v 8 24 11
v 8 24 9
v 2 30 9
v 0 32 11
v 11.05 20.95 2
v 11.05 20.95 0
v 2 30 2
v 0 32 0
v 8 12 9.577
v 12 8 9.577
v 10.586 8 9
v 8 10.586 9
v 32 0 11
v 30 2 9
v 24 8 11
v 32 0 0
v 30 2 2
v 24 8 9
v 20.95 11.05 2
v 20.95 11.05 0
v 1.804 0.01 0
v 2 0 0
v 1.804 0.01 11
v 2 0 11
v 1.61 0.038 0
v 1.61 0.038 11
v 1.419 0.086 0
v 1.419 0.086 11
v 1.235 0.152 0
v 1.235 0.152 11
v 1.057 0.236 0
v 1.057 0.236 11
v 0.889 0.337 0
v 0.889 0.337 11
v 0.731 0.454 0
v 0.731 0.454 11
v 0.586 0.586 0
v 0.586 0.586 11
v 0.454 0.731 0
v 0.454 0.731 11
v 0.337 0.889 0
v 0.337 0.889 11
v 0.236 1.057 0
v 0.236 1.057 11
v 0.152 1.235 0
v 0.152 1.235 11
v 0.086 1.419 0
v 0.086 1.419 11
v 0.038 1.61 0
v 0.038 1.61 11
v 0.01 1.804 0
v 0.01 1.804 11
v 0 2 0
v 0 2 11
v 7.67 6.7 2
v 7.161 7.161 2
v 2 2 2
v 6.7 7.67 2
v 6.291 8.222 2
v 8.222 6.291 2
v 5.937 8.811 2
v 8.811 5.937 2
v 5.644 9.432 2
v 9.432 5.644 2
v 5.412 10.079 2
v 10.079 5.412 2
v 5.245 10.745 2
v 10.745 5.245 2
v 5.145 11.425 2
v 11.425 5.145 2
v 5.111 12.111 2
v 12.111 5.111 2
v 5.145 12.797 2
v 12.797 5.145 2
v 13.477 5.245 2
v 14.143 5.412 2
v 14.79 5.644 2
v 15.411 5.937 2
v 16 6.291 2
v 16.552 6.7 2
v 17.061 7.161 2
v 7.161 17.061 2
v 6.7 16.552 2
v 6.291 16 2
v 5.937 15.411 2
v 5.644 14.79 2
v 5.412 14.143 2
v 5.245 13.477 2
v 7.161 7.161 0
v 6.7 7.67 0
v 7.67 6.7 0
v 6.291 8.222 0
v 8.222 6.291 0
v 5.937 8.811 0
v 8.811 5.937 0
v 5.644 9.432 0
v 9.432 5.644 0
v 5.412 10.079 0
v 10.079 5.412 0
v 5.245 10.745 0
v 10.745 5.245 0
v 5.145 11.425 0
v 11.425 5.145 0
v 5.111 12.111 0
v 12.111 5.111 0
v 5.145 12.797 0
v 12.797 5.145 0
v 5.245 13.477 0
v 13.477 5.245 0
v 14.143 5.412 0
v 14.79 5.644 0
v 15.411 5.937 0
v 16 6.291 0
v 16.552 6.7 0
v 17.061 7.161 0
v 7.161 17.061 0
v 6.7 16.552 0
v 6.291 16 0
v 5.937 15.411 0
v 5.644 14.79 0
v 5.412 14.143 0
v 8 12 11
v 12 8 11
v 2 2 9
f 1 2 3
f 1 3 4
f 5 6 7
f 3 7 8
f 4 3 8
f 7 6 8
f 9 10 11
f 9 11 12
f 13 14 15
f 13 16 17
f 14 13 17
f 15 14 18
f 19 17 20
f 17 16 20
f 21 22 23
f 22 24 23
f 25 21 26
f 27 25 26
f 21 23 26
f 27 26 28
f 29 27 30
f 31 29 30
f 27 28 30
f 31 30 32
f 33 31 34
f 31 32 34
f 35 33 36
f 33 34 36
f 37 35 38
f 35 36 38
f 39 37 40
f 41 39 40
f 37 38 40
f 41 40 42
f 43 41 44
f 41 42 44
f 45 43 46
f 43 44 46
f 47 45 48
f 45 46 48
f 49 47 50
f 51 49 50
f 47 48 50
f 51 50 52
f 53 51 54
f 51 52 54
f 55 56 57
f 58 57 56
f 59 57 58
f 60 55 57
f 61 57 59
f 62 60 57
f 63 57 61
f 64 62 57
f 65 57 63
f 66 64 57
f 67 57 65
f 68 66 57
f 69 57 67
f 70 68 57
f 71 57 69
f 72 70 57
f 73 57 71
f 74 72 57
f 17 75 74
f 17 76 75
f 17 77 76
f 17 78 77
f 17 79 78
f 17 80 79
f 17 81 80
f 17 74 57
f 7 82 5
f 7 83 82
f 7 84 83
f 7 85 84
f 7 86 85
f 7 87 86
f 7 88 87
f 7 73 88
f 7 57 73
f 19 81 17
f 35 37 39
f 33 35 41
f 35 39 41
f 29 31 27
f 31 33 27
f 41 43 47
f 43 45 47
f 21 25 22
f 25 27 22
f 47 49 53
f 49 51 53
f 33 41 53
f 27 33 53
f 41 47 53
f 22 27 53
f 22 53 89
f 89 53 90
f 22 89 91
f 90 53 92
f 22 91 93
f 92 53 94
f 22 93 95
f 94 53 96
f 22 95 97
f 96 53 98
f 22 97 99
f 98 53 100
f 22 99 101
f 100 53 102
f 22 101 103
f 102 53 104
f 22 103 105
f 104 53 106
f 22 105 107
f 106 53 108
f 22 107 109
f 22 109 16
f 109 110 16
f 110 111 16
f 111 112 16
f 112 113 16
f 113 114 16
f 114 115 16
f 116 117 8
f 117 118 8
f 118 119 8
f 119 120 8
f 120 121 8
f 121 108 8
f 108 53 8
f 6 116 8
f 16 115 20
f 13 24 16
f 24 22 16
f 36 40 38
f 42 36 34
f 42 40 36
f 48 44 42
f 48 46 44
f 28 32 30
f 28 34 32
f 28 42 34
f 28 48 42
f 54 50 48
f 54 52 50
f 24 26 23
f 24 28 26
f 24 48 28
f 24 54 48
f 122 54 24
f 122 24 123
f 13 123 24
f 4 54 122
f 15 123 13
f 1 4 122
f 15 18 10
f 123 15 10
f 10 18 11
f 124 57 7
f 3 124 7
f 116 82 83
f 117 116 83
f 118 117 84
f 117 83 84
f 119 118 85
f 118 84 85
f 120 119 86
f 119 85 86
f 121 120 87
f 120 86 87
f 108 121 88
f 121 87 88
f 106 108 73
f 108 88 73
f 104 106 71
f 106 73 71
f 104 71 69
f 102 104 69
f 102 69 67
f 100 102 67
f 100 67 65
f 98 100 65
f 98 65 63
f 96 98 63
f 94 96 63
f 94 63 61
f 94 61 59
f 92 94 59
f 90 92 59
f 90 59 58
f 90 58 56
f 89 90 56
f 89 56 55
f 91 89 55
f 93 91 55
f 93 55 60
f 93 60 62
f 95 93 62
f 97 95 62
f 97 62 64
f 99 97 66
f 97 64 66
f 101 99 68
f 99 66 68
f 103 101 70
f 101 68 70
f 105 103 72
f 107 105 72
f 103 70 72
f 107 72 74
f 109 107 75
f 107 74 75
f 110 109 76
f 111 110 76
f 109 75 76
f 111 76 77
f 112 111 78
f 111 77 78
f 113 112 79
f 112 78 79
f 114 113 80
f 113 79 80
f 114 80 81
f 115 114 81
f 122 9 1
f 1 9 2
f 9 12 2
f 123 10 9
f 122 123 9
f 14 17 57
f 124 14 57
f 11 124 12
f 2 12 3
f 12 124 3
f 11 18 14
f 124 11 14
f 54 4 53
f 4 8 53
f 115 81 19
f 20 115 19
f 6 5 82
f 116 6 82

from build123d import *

# Parameters (mm, degrees)
F1_DEPTH = 2
F3_DEPTH = 25
F5_DEPTH = 7
F7_DEPTH = 2
F8_SIZE2 = 0.5773502692
F8_SIZE  = 1
F9_R     = 2


with BuildPart() as f1:
    # F0 (on Top) → F1 (new body)
    with BuildSketch(Plane.XY):
        Polygon((0, 32), (0, 0), (32, 0), align=None)
    extrude(amount=F1_DEPTH)

    # F2 (on face) → F3 (cut)
    with BuildSketch(Plane.XY.offset(2)):
        with BuildLine():
            Line((11.0502525317, 20.9497474683), (7.1611652352, 17.0606601718))
            ThreePointArc((7.1611652352, 17.0606601718), (7.1611652352, 7.1611652352), (17.0606601718, 7.1611652352))
            Line((17.0606601718, 7.1611652352), (20.9497474683, 11.0502525317))
            Line((20.9497474683, 11.0502525317), (11.0502525317, 20.9497474683))
        make_face()
    extrude(amount=-F3_DEPTH, mode=Mode.SUBTRACT)

    # F4 (on face) → F5 (join)
    with BuildSketch(Plane.XY.offset(2)):
        Polygon((0, 32), (0, 0), (32, 0), (30, 2), (2, 2), (2, 30), align=None)
    extrude(amount=F5_DEPTH)

    # F6 (on face) → F7 (join)
    with BuildSketch(Plane.XY.offset(9)):
        Polygon((0, 32), (0, 0), (32, 0), (30, 2), (24, 8), (12, 8), (8, 12), (8, 24), (2, 30), align=None)
    extrude(amount=F7_DEPTH)

    # F8
    f8_edges = [f1.edges().sort_by_distance(p)[0] for p in [
        (10, 10, 9),
    ]]
    chamfer(f8_edges, length=F8_SIZE, length2=F8_SIZE2)

    # F9
    f9_edges = [f1.edges().sort_by_distance(p)[0] for p in [
        (0, 0, 5.5),
    ]]
    fillet(f9_edges, radius=F9_R)


solid = f1.part
